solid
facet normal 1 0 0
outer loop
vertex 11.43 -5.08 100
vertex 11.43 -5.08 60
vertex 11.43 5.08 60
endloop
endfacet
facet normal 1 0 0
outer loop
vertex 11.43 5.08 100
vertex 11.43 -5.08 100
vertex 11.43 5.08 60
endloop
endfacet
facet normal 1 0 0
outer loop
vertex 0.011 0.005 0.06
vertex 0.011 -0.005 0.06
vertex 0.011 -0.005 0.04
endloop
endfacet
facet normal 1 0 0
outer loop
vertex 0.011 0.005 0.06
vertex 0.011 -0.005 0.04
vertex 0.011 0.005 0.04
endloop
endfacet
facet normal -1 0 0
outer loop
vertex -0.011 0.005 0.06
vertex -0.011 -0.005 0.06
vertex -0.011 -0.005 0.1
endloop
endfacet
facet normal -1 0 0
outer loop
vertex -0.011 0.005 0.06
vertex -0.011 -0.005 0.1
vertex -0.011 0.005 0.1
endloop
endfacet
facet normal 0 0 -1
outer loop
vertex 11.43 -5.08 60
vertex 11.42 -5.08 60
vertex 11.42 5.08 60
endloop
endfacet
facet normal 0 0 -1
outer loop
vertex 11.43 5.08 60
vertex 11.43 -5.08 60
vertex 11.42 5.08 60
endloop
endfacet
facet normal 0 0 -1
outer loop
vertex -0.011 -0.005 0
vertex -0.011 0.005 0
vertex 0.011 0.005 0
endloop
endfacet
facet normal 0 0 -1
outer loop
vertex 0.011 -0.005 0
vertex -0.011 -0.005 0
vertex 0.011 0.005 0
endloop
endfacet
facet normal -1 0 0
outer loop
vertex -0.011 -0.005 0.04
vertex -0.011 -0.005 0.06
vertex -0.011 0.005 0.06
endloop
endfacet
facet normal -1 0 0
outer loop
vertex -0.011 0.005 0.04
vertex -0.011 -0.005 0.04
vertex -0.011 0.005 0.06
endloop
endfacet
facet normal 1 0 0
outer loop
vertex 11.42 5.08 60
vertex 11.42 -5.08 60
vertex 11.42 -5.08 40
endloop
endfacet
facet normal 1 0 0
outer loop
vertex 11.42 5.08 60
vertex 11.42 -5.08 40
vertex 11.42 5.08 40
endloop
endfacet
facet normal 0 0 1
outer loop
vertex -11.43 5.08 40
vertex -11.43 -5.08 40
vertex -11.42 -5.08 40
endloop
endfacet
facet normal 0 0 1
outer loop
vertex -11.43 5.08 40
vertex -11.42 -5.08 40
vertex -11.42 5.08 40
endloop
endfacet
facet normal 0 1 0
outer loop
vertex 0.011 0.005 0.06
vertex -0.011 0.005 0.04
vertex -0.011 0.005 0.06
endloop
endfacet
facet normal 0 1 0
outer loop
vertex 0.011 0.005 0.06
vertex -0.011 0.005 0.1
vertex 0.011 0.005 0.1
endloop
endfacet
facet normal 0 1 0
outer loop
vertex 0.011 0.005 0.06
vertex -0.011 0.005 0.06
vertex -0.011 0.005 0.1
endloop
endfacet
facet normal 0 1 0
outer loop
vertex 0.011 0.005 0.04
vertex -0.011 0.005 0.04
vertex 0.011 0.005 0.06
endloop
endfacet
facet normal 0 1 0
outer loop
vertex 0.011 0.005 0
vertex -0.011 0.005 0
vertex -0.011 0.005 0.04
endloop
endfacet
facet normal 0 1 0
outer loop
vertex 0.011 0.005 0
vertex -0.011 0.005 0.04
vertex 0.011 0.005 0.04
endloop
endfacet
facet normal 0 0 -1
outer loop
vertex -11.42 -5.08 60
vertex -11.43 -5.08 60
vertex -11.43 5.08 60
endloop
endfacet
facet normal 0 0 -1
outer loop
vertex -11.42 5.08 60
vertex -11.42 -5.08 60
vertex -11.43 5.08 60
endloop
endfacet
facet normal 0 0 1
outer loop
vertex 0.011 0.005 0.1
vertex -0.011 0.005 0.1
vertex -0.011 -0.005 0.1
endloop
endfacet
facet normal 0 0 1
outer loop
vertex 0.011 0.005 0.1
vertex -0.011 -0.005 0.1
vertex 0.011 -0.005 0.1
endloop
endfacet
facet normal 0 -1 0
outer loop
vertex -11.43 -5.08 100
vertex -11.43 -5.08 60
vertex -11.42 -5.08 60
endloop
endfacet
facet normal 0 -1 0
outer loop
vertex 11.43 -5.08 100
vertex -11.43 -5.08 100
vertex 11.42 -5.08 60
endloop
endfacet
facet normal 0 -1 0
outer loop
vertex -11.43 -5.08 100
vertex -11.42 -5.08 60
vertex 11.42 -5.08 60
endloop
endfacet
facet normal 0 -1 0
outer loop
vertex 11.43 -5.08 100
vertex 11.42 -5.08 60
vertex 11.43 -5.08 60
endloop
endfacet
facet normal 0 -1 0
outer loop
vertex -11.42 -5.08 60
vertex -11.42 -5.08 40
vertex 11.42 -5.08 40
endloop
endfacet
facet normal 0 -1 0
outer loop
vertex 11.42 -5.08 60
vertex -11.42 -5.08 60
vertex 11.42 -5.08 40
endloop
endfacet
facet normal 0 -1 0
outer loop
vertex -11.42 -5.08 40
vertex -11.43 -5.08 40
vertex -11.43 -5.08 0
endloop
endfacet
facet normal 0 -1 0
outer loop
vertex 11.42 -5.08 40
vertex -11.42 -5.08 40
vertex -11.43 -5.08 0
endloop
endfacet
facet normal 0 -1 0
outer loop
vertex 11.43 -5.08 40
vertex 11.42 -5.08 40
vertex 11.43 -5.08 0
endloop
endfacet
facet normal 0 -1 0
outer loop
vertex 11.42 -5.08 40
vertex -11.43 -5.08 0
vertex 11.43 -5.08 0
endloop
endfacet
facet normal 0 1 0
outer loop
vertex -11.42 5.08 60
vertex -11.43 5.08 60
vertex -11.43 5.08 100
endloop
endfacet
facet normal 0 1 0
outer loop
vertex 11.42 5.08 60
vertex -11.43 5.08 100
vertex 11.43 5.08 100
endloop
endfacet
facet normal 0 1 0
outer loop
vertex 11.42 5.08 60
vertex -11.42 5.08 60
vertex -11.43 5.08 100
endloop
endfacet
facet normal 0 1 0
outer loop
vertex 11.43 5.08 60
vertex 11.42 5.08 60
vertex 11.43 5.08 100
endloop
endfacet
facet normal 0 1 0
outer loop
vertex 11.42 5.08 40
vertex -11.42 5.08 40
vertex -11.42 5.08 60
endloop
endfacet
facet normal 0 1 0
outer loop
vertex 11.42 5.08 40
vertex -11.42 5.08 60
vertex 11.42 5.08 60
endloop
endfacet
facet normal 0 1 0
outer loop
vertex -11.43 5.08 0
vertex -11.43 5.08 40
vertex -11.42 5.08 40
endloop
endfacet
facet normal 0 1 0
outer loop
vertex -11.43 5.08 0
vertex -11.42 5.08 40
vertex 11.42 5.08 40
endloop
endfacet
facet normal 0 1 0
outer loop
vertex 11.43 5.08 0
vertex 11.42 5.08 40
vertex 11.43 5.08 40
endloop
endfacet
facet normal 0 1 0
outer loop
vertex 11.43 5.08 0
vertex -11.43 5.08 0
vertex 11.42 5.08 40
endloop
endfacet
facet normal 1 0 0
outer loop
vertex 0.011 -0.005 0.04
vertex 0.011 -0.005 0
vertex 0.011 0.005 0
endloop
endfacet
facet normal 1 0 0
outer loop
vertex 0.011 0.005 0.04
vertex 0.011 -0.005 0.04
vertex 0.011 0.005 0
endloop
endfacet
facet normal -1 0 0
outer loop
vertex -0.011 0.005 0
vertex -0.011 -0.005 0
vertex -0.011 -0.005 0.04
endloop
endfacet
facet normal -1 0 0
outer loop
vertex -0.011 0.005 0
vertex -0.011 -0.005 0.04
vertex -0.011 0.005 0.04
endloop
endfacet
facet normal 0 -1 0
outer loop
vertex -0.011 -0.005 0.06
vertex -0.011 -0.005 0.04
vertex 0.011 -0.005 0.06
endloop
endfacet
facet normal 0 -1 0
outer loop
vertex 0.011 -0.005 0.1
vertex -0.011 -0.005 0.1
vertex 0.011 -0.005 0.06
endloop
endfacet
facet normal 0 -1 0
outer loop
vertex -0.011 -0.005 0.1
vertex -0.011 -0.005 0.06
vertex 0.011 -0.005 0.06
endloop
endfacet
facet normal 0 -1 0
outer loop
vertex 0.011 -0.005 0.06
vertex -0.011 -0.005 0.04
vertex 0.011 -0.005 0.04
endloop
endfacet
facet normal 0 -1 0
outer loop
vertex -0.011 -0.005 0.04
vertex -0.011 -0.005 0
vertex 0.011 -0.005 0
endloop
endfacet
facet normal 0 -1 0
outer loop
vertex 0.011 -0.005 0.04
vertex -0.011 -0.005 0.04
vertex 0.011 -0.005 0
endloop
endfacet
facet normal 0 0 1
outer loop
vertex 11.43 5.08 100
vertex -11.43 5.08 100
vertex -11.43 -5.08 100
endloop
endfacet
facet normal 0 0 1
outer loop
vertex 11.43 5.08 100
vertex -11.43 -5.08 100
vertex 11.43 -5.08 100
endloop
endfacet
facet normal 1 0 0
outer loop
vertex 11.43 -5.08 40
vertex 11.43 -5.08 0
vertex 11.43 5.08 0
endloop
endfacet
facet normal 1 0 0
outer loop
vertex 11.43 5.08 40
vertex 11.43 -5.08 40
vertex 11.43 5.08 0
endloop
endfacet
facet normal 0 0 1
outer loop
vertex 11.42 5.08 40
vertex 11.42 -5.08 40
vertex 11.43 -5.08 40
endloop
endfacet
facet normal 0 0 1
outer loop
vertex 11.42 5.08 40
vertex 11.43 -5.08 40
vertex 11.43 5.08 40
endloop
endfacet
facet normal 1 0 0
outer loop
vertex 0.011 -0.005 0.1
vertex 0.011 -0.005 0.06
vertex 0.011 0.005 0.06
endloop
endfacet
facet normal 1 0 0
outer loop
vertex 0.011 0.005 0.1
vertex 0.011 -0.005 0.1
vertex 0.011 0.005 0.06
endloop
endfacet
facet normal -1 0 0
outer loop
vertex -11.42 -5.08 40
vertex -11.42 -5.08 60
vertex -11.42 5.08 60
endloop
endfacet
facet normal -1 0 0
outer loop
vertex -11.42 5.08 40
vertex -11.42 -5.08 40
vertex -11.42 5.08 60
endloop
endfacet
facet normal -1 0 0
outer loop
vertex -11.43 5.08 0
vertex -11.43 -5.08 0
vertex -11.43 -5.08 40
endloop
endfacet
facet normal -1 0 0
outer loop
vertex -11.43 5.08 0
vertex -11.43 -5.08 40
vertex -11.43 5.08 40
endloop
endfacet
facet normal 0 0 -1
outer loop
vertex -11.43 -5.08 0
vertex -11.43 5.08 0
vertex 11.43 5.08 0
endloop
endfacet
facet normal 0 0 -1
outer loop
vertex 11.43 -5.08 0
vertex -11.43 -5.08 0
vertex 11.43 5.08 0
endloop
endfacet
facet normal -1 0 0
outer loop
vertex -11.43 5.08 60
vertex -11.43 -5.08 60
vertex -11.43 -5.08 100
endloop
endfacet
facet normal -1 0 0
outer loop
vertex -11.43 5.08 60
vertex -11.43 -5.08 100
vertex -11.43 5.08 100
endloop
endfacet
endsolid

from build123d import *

# Parameters (mm, degrees)
RECTANGLE003_W       = 10.16
RECTANGLE003_H       = 20
EXTRUDE001_DEPTH     = 0.01
RECTANGLE_W          = 22.86
RECTANGLE_H          = 10.16
EXTRUDE_DEPTH        = 100
CLONE001_SCALE_SCALE = 0.001


with BuildPart() as extrude001:
    # Rectangle003 → Extrude001 (new body)
    with BuildSketch(Plane(origin=(11.43, -5.08, 40), x_dir=(0, 1, 0), z_dir=(1, 0, 0))):
        with Locations((5.08, 10)):
            Rectangle(RECTANGLE003_W, RECTANGLE003_H)
    extrude(amount=EXTRUDE001_DEPTH)


with BuildPart() as extrude001_1:
    # Extrude001 placement: moved
    add(extrude001.part.moved(Location((-0.01, 0, 0))))


with BuildPart() as extrude002:
    # Clone base: copy of Extrude001
    add(extrude001_1.part)


with BuildPart() as extrude002_1:
    # Clone placement: moved
    add(extrude002.part.moved(Location((-22.85, 0, 0))))


with BuildPart() as cut001:
    # Rectangle → Extrude (new body)
    with BuildSketch(Plane(origin=(-11.43, -5.08, 0), x_dir=(1, 0, 0), z_dir=(0, 0, 1))):
        with Locations((11.43, 5.08)):
            Rectangle(RECTANGLE_W, RECTANGLE_H)
    extrude(amount=EXTRUDE_DEPTH)

    # Cut: cut Extrude001
    add(extrude001_1.part, mode=Mode.SUBTRACT)

    # Cut001: cut Extrude002
    add(extrude002_1.part, mode=Mode.SUBTRACT)


with BuildPart() as scaled:
    # Clone001 base: copy of Cut001
    add(cut001.part)


with BuildPart() as scaled_1:
    # Clone001 scale: moved
    add(scaled.part.scale(CLONE001_SCALE_SCALE))


solid = Compound([cut001.part, scaled_1.part])
